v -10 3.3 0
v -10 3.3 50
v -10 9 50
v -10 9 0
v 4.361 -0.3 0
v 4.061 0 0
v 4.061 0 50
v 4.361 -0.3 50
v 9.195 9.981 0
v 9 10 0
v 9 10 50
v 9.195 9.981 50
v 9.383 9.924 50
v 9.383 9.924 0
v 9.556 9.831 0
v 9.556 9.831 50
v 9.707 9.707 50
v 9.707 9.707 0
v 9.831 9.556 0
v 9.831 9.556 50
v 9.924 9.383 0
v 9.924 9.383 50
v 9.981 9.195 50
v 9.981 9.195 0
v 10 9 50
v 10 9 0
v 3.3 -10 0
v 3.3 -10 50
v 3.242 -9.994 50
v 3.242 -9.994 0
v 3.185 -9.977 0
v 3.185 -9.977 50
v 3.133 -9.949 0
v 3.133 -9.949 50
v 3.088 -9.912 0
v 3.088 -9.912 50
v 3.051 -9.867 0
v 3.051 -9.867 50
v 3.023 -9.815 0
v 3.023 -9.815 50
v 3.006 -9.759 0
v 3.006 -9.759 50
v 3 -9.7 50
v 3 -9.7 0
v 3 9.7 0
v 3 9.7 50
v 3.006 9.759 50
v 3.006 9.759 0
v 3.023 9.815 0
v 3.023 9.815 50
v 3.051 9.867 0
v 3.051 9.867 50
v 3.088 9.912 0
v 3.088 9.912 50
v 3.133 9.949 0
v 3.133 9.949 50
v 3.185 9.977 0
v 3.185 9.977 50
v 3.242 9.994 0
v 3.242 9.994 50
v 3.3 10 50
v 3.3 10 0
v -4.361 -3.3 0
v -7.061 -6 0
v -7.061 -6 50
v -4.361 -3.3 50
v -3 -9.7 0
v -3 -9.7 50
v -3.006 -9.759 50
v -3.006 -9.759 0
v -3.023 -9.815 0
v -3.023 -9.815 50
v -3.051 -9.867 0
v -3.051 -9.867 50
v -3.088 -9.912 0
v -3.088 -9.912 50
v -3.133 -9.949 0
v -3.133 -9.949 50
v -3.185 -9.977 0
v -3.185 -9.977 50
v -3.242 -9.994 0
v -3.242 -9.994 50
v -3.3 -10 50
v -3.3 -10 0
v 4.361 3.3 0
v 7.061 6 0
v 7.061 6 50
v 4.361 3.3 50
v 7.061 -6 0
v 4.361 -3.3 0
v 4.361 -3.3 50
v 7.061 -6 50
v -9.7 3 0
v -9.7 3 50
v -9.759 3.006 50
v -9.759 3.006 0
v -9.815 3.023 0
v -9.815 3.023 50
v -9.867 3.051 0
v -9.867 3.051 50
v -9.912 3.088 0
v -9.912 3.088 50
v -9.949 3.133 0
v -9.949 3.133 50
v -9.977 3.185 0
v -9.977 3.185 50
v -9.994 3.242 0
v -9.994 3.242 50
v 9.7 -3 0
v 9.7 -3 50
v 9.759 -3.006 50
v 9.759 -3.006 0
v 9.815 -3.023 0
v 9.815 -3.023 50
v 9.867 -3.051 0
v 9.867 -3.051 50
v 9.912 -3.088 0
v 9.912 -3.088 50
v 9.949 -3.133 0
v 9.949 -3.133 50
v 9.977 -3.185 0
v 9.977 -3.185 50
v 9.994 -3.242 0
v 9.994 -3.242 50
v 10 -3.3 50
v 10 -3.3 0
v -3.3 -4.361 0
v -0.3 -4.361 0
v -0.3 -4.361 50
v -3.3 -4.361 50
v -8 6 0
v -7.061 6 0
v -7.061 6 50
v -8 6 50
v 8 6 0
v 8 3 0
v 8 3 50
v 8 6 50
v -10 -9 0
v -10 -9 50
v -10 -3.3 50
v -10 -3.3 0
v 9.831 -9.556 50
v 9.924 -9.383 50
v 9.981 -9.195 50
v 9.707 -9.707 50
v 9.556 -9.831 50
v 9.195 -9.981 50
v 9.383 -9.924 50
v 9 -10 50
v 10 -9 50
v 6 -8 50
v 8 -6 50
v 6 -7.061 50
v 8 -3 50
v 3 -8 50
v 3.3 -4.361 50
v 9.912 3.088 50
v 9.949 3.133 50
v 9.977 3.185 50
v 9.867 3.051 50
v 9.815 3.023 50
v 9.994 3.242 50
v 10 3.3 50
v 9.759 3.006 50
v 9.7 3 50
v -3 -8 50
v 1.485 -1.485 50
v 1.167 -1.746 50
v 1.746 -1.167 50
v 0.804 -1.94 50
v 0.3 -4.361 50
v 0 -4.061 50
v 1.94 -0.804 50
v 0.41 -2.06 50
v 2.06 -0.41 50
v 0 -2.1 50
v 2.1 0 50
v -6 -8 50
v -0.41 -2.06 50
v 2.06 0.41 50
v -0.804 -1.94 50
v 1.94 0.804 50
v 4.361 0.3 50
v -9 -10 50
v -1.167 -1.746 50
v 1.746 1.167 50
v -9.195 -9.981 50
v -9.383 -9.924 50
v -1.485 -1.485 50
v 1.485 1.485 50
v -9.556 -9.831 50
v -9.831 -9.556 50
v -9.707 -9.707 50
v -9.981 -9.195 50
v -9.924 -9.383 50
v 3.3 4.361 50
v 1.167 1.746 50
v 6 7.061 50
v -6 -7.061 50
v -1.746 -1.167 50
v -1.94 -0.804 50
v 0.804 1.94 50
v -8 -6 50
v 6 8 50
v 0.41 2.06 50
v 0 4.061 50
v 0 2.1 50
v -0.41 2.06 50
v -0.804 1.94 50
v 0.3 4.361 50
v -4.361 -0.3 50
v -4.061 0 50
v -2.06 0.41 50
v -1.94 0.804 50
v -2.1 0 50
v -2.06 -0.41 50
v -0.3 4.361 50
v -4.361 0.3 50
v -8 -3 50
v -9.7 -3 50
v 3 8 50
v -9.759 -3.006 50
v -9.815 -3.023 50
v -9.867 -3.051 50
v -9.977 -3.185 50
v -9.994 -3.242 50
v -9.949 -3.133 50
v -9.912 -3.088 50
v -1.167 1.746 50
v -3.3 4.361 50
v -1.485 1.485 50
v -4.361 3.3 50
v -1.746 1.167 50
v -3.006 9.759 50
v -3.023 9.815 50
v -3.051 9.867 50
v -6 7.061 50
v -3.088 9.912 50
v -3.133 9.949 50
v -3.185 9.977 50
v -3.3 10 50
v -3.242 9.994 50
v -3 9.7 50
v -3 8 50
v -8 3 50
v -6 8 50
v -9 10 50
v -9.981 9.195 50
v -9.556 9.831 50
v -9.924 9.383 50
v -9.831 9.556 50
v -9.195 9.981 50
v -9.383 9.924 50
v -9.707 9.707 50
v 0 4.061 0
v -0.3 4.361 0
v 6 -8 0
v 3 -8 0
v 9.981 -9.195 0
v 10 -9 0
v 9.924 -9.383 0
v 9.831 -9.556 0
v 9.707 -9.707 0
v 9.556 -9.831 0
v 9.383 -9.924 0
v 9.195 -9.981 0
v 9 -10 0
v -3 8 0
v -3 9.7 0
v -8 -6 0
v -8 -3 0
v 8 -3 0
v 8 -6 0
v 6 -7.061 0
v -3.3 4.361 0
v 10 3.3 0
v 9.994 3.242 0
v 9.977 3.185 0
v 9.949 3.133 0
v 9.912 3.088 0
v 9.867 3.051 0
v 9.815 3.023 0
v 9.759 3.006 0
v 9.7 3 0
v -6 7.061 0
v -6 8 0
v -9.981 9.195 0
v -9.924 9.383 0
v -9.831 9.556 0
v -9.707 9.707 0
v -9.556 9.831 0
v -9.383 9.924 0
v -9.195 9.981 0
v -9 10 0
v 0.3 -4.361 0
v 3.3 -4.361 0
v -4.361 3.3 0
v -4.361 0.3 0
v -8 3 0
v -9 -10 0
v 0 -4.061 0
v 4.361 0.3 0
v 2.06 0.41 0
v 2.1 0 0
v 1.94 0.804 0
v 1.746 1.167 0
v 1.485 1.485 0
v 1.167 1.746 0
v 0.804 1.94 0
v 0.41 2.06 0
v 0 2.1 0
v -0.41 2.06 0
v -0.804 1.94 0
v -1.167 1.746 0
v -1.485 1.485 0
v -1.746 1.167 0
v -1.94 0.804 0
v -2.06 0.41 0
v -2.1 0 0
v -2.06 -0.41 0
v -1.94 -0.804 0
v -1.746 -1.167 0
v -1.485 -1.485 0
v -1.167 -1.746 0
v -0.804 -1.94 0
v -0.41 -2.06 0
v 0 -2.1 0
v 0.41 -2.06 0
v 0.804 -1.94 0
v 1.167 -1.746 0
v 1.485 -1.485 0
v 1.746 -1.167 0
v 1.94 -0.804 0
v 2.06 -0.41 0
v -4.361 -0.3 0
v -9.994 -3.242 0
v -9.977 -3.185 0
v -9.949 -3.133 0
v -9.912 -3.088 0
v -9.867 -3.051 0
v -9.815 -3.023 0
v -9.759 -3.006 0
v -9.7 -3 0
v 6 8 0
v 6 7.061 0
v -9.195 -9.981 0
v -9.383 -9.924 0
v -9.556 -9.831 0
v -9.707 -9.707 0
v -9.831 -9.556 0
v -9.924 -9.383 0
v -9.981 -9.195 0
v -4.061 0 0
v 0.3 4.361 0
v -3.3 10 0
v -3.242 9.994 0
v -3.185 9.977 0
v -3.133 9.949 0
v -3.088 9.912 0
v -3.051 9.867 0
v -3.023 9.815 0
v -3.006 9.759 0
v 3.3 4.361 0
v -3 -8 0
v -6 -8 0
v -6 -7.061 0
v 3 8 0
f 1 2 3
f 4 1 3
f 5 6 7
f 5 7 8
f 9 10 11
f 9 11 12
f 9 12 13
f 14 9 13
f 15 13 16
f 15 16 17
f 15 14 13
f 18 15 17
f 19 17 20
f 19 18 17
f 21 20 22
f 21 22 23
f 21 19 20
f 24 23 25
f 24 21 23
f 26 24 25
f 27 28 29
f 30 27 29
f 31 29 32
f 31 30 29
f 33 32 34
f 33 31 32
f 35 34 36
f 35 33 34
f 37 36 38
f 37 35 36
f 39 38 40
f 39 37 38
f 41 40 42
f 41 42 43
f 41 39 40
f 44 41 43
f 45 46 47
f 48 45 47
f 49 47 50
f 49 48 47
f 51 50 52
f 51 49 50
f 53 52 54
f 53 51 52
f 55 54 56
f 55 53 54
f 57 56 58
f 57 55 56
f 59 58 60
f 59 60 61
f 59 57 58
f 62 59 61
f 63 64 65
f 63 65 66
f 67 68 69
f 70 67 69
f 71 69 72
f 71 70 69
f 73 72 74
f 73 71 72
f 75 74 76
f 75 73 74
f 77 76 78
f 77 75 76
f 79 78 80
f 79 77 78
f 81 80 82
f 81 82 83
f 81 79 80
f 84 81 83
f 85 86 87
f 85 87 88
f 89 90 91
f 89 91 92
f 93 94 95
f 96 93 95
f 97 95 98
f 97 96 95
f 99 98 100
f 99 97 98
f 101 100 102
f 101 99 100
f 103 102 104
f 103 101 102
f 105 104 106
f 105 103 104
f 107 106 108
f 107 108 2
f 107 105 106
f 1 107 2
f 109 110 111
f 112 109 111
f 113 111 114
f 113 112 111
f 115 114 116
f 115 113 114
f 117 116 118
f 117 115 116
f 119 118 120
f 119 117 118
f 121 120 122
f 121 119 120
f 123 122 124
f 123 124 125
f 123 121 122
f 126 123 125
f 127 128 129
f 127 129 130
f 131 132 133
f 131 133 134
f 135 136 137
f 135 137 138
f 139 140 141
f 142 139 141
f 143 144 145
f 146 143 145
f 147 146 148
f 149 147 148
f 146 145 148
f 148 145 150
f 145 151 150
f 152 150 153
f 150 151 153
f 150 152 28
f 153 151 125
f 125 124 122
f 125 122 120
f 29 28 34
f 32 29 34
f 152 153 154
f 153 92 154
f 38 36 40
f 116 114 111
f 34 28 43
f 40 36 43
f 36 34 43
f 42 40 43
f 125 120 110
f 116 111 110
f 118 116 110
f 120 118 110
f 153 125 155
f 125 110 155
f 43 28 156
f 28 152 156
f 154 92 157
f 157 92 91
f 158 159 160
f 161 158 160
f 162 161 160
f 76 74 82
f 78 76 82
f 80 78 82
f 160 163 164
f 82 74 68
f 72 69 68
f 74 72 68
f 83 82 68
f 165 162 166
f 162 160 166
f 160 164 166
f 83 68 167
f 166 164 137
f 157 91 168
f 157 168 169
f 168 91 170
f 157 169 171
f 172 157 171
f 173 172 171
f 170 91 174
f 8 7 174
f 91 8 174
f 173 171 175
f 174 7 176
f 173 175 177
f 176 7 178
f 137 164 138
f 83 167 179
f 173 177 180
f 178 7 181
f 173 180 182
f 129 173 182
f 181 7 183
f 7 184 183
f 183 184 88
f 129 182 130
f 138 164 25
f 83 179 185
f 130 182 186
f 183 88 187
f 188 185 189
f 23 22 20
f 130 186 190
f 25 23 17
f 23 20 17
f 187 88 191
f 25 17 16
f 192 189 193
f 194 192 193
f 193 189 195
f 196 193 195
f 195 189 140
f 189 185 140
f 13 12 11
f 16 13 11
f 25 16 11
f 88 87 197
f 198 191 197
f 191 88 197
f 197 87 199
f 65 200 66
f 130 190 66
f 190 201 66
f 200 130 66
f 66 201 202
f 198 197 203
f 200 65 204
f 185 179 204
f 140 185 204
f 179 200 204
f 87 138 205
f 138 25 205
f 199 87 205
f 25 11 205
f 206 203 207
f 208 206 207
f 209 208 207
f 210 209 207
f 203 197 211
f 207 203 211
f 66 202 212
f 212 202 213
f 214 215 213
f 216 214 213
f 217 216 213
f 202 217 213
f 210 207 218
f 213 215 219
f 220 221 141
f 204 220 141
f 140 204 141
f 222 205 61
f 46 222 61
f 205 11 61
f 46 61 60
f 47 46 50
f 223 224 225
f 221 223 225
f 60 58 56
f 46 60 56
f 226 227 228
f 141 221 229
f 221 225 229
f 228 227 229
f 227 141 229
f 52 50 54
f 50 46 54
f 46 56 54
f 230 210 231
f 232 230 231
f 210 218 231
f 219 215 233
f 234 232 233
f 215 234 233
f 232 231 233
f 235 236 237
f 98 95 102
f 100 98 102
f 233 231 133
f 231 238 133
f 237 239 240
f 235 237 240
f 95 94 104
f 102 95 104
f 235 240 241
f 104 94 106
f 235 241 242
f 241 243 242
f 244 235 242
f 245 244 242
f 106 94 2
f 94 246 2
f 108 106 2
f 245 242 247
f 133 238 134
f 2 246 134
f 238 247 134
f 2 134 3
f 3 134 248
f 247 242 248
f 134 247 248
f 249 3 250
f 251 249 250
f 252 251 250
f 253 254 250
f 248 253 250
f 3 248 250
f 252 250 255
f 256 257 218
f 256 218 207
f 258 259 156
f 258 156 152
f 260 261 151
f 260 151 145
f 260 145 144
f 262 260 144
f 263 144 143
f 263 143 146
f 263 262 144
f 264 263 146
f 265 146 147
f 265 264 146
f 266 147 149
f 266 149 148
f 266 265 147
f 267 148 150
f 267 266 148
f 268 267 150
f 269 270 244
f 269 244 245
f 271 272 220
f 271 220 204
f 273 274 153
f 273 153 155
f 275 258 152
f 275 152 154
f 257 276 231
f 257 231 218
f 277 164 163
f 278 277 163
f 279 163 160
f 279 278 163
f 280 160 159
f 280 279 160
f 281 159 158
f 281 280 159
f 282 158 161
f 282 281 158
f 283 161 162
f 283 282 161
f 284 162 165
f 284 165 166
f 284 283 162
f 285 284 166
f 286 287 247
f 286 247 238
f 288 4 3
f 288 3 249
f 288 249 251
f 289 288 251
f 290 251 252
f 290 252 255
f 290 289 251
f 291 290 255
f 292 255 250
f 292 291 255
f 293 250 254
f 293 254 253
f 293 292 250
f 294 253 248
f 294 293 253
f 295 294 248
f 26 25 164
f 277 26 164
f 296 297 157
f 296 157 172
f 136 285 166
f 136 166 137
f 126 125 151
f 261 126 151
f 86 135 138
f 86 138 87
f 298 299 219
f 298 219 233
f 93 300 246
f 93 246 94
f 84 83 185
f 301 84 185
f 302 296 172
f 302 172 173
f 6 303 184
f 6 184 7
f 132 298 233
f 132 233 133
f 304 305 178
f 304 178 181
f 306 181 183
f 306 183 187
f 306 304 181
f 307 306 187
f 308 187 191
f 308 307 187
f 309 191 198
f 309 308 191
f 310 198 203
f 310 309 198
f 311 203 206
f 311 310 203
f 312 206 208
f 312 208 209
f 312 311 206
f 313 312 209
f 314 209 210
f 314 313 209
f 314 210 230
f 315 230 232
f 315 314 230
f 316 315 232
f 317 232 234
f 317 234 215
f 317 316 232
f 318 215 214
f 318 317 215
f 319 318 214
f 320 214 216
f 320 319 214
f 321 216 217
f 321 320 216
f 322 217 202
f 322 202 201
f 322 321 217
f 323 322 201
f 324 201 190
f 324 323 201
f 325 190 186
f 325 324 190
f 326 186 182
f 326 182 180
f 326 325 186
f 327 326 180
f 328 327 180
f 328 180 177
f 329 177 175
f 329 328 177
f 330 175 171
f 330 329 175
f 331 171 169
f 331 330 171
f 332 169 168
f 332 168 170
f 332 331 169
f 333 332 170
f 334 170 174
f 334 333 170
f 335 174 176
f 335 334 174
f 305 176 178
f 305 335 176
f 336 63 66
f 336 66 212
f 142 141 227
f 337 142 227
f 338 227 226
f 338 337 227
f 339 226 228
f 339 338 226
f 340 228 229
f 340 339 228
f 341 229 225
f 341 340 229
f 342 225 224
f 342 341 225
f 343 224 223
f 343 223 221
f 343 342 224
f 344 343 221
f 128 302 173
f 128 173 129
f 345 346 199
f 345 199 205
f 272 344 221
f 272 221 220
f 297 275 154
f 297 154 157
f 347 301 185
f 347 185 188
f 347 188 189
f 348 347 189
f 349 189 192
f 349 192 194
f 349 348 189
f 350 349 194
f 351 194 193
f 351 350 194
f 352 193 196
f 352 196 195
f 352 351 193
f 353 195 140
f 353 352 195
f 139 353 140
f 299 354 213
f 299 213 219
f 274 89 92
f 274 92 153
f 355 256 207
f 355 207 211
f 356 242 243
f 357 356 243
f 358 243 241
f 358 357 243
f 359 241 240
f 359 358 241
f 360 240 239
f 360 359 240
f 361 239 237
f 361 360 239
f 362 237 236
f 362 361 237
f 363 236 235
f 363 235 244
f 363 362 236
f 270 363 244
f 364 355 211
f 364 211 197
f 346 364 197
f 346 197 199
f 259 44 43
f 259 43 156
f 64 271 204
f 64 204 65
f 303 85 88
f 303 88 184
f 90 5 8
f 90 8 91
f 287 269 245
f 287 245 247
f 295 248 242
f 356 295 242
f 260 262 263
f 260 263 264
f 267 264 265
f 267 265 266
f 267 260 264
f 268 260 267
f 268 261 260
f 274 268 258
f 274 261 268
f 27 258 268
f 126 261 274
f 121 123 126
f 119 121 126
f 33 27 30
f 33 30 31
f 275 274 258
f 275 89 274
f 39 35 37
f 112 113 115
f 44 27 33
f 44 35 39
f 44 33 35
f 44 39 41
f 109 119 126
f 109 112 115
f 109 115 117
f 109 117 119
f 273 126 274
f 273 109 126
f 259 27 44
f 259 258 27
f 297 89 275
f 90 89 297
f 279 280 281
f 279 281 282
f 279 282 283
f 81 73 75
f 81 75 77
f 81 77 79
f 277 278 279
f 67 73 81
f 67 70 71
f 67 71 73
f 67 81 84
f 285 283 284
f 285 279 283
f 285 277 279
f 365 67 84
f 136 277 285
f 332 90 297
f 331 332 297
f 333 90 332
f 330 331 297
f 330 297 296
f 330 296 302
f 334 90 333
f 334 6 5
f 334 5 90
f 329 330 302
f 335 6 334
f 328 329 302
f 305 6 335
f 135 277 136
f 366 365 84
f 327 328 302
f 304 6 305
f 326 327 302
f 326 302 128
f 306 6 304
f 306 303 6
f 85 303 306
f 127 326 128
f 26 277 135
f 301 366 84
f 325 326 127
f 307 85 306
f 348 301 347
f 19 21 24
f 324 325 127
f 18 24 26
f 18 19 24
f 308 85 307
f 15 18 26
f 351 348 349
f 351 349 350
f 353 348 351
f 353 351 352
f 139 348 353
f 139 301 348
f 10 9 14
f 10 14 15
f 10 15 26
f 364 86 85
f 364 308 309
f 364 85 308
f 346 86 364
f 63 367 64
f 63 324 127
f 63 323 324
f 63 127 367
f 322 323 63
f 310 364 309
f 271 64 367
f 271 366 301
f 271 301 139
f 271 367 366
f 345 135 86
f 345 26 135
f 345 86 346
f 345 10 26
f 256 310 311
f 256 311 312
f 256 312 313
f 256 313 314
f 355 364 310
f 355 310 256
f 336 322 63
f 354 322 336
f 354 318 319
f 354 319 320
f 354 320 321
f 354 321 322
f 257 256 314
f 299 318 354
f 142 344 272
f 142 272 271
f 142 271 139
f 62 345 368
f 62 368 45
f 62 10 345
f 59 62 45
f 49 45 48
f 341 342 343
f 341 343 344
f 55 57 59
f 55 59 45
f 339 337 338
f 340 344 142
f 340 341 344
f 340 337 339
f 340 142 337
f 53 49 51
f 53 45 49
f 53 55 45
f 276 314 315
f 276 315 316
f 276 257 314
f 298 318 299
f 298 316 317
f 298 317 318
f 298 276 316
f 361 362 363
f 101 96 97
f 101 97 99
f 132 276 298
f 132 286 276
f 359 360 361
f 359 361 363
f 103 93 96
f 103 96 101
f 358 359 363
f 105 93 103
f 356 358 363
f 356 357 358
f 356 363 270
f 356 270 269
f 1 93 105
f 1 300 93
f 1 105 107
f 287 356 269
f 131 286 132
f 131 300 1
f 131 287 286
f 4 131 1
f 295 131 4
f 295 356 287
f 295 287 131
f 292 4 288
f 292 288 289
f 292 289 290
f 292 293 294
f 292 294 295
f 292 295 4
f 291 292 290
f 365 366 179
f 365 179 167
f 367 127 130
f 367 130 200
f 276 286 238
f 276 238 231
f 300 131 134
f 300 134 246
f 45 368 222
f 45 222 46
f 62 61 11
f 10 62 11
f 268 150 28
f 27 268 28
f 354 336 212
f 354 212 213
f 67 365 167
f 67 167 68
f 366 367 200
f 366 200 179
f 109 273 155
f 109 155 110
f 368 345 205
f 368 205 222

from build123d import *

# Parameters (mm, degrees)
SKETCH1_R           = 2.1
BOSS_EXTRUDE1_DEPTH = 50


with BuildPart() as part:
    # Sketch1 → Boss-Extrude1 (new body)
    with BuildSketch(Plane.XY):
        with BuildLine():
            Line((3.3, 4.360660172), (6.000039828, 7.0607))
            Line((6.000039828, 7.0607), (6.000039828, 8))
            Line((6.000039828, 8), (3.000039828, 8))
            Line((3.000039828, 8), (3.000039828, 9.7))
            ThreePointArc((3.000039828, 9.7), (3.087907794, 9.912132034), (3.300039828, 10))
            Line((3.300039828, 10), (9, 10))
            ThreePointArc((9, 10), (9.707106781, 9.707106781), (10, 9))
            Line((10, 9), (10, 3.300039828))
            ThreePointArc((10, 3.300039828), (9.912132034, 3.087907794), (9.7, 3.000039828))
            Line((9.7, 3.000039828), (8, 3.000039828))
            Line((8, 3.000039828), (8, 6.000039828))
            Line((8, 6.000039828), (7.0607, 6.000039828))
            Line((7.0607, 6.000039828), (4.360660172, 3.3))
            Line((4.360660172, 3.3), (4.360660172, 0.3))
            Line((4.360660172, 0.3), (4.060660172, 0))
            Line((4.060660172, 0), (4.360660172, -0.3))
            Line((4.360660172, -0.3), (4.360660172, -3.3))
            Line((4.360660172, -3.3), (7.0607, -6.000039828))
            Line((7.0607, -6.000039828), (8, -6.000039828))
            Line((8, -6.000039828), (8, -3.000039828))
            Line((8, -3.000039828), (9.7, -3.000039828))
            ThreePointArc((9.7, -3.000039828), (9.912132034, -3.087907794), (10, -3.300039828))
            Line((10, -3.300039828), (10, -9))
            ThreePointArc((10, -9), (9.707106781, -9.707106781), (9, -10))
            Line((9, -10), (3.300039828, -10))
            ThreePointArc((3.300039828, -10), (3.087907794, -9.912132034), (3.000039828, -9.7))
            Line((3.000039828, -9.7), (3.000039828, -8))
            Line((3.000039828, -8), (6.000039828, -8))
            Line((6.000039828, -8), (6.000039828, -7.0607))
            Line((6.000039828, -7.0607), (3.3, -4.360660172))
            Line((3.3, -4.360660172), (0.3, -4.360660172))
            Line((0.3, -4.360660172), (0, -4.060660172))
            Line((0, -4.060660172), (-0.3, -4.360660172))
            Line((-0.3, -4.360660172), (-3.3, -4.360660172))
            Line((-3.3, -4.360660172), (-6.000039828, -7.0607))
            Line((-6.000039828, -7.0607), (-6.000039828, -8))
            Line((-6.000039828, -8), (-3.000039828, -8))
            Line((-3.000039828, -8), (-3.000039828, -9.7))
            ThreePointArc((-3.000039828, -9.7), (-3.087907794, -9.912132034), (-3.300039828, -10))
            Line((-3.300039828, -10), (-9, -10))
            ThreePointArc((-9, -10), (-9.707106781, -9.707106781), (-10, -9))
            Line((-10, -9), (-10, -3.300039828))
            ThreePointArc((-10, -3.300039828), (-9.912132034, -3.087907794), (-9.7, -3.000039828))
            Line((-9.7, -3.000039828), (-8, -3.000039828))
            Line((-8, -3.000039828), (-8, -6.000039828))
            Line((-8, -6.000039828), (-7.0607, -6.000039828))
            Line((-7.0607, -6.000039828), (-4.360660172, -3.3))
            Line((-4.360660172, -3.3), (-4.360660172, -0.3))
            Line((-4.360660172, -0.3), (-4.060660172, 0))
            Line((-4.060660172, 0), (-4.360660172, 0.3))
            Line((-4.360660172, 0.3), (-4.360660172, 3.3))
            Line((-4.360660172, 3.3), (-7.0607, 6.000039828))
            Line((-7.0607, 6.000039828), (-8, 6.000039828))
            Line((-8, 6.000039828), (-8, 3.000039828))
            Line((-8, 3.000039828), (-9.7, 3.000039828))
            ThreePointArc((-9.7, 3.000039828), (-9.912132034, 3.087907794), (-10, 3.300039828))
            Line((-10, 3.300039828), (-10, 9))
            ThreePointArc((-10, 9), (-9.707106781, 9.707106781), (-9, 10))
            Line((-9, 10), (-3.300039828, 10))
            ThreePointArc((-3.300039828, 10), (-3.087907794, 9.912132034), (-3.000039828, 9.7))
            Line((-3.000039828, 9.7), (-3.000039828, 8))
            Line((-3.000039828, 8), (-6.000039828, 8))
            Line((-6.000039828, 8), (-6.000039828, 7.0607))
            Line((-6.000039828, 7.0607), (-3.3, 4.360660172))
            Line((-3.3, 4.360660172), (-0.3, 4.360660172))
            Line((-0.3, 4.360660172), (0, 4.060660172))
            Line((0, 4.060660172), (0.3, 4.360660172))
            Line((0.3, 4.360660172), (3.3, 4.360660172))
        make_face()
        Circle(SKETCH1_R, mode=Mode.SUBTRACT)
    extrude(amount=BOSS_EXTRUDE1_DEPTH)


solid = part.part
